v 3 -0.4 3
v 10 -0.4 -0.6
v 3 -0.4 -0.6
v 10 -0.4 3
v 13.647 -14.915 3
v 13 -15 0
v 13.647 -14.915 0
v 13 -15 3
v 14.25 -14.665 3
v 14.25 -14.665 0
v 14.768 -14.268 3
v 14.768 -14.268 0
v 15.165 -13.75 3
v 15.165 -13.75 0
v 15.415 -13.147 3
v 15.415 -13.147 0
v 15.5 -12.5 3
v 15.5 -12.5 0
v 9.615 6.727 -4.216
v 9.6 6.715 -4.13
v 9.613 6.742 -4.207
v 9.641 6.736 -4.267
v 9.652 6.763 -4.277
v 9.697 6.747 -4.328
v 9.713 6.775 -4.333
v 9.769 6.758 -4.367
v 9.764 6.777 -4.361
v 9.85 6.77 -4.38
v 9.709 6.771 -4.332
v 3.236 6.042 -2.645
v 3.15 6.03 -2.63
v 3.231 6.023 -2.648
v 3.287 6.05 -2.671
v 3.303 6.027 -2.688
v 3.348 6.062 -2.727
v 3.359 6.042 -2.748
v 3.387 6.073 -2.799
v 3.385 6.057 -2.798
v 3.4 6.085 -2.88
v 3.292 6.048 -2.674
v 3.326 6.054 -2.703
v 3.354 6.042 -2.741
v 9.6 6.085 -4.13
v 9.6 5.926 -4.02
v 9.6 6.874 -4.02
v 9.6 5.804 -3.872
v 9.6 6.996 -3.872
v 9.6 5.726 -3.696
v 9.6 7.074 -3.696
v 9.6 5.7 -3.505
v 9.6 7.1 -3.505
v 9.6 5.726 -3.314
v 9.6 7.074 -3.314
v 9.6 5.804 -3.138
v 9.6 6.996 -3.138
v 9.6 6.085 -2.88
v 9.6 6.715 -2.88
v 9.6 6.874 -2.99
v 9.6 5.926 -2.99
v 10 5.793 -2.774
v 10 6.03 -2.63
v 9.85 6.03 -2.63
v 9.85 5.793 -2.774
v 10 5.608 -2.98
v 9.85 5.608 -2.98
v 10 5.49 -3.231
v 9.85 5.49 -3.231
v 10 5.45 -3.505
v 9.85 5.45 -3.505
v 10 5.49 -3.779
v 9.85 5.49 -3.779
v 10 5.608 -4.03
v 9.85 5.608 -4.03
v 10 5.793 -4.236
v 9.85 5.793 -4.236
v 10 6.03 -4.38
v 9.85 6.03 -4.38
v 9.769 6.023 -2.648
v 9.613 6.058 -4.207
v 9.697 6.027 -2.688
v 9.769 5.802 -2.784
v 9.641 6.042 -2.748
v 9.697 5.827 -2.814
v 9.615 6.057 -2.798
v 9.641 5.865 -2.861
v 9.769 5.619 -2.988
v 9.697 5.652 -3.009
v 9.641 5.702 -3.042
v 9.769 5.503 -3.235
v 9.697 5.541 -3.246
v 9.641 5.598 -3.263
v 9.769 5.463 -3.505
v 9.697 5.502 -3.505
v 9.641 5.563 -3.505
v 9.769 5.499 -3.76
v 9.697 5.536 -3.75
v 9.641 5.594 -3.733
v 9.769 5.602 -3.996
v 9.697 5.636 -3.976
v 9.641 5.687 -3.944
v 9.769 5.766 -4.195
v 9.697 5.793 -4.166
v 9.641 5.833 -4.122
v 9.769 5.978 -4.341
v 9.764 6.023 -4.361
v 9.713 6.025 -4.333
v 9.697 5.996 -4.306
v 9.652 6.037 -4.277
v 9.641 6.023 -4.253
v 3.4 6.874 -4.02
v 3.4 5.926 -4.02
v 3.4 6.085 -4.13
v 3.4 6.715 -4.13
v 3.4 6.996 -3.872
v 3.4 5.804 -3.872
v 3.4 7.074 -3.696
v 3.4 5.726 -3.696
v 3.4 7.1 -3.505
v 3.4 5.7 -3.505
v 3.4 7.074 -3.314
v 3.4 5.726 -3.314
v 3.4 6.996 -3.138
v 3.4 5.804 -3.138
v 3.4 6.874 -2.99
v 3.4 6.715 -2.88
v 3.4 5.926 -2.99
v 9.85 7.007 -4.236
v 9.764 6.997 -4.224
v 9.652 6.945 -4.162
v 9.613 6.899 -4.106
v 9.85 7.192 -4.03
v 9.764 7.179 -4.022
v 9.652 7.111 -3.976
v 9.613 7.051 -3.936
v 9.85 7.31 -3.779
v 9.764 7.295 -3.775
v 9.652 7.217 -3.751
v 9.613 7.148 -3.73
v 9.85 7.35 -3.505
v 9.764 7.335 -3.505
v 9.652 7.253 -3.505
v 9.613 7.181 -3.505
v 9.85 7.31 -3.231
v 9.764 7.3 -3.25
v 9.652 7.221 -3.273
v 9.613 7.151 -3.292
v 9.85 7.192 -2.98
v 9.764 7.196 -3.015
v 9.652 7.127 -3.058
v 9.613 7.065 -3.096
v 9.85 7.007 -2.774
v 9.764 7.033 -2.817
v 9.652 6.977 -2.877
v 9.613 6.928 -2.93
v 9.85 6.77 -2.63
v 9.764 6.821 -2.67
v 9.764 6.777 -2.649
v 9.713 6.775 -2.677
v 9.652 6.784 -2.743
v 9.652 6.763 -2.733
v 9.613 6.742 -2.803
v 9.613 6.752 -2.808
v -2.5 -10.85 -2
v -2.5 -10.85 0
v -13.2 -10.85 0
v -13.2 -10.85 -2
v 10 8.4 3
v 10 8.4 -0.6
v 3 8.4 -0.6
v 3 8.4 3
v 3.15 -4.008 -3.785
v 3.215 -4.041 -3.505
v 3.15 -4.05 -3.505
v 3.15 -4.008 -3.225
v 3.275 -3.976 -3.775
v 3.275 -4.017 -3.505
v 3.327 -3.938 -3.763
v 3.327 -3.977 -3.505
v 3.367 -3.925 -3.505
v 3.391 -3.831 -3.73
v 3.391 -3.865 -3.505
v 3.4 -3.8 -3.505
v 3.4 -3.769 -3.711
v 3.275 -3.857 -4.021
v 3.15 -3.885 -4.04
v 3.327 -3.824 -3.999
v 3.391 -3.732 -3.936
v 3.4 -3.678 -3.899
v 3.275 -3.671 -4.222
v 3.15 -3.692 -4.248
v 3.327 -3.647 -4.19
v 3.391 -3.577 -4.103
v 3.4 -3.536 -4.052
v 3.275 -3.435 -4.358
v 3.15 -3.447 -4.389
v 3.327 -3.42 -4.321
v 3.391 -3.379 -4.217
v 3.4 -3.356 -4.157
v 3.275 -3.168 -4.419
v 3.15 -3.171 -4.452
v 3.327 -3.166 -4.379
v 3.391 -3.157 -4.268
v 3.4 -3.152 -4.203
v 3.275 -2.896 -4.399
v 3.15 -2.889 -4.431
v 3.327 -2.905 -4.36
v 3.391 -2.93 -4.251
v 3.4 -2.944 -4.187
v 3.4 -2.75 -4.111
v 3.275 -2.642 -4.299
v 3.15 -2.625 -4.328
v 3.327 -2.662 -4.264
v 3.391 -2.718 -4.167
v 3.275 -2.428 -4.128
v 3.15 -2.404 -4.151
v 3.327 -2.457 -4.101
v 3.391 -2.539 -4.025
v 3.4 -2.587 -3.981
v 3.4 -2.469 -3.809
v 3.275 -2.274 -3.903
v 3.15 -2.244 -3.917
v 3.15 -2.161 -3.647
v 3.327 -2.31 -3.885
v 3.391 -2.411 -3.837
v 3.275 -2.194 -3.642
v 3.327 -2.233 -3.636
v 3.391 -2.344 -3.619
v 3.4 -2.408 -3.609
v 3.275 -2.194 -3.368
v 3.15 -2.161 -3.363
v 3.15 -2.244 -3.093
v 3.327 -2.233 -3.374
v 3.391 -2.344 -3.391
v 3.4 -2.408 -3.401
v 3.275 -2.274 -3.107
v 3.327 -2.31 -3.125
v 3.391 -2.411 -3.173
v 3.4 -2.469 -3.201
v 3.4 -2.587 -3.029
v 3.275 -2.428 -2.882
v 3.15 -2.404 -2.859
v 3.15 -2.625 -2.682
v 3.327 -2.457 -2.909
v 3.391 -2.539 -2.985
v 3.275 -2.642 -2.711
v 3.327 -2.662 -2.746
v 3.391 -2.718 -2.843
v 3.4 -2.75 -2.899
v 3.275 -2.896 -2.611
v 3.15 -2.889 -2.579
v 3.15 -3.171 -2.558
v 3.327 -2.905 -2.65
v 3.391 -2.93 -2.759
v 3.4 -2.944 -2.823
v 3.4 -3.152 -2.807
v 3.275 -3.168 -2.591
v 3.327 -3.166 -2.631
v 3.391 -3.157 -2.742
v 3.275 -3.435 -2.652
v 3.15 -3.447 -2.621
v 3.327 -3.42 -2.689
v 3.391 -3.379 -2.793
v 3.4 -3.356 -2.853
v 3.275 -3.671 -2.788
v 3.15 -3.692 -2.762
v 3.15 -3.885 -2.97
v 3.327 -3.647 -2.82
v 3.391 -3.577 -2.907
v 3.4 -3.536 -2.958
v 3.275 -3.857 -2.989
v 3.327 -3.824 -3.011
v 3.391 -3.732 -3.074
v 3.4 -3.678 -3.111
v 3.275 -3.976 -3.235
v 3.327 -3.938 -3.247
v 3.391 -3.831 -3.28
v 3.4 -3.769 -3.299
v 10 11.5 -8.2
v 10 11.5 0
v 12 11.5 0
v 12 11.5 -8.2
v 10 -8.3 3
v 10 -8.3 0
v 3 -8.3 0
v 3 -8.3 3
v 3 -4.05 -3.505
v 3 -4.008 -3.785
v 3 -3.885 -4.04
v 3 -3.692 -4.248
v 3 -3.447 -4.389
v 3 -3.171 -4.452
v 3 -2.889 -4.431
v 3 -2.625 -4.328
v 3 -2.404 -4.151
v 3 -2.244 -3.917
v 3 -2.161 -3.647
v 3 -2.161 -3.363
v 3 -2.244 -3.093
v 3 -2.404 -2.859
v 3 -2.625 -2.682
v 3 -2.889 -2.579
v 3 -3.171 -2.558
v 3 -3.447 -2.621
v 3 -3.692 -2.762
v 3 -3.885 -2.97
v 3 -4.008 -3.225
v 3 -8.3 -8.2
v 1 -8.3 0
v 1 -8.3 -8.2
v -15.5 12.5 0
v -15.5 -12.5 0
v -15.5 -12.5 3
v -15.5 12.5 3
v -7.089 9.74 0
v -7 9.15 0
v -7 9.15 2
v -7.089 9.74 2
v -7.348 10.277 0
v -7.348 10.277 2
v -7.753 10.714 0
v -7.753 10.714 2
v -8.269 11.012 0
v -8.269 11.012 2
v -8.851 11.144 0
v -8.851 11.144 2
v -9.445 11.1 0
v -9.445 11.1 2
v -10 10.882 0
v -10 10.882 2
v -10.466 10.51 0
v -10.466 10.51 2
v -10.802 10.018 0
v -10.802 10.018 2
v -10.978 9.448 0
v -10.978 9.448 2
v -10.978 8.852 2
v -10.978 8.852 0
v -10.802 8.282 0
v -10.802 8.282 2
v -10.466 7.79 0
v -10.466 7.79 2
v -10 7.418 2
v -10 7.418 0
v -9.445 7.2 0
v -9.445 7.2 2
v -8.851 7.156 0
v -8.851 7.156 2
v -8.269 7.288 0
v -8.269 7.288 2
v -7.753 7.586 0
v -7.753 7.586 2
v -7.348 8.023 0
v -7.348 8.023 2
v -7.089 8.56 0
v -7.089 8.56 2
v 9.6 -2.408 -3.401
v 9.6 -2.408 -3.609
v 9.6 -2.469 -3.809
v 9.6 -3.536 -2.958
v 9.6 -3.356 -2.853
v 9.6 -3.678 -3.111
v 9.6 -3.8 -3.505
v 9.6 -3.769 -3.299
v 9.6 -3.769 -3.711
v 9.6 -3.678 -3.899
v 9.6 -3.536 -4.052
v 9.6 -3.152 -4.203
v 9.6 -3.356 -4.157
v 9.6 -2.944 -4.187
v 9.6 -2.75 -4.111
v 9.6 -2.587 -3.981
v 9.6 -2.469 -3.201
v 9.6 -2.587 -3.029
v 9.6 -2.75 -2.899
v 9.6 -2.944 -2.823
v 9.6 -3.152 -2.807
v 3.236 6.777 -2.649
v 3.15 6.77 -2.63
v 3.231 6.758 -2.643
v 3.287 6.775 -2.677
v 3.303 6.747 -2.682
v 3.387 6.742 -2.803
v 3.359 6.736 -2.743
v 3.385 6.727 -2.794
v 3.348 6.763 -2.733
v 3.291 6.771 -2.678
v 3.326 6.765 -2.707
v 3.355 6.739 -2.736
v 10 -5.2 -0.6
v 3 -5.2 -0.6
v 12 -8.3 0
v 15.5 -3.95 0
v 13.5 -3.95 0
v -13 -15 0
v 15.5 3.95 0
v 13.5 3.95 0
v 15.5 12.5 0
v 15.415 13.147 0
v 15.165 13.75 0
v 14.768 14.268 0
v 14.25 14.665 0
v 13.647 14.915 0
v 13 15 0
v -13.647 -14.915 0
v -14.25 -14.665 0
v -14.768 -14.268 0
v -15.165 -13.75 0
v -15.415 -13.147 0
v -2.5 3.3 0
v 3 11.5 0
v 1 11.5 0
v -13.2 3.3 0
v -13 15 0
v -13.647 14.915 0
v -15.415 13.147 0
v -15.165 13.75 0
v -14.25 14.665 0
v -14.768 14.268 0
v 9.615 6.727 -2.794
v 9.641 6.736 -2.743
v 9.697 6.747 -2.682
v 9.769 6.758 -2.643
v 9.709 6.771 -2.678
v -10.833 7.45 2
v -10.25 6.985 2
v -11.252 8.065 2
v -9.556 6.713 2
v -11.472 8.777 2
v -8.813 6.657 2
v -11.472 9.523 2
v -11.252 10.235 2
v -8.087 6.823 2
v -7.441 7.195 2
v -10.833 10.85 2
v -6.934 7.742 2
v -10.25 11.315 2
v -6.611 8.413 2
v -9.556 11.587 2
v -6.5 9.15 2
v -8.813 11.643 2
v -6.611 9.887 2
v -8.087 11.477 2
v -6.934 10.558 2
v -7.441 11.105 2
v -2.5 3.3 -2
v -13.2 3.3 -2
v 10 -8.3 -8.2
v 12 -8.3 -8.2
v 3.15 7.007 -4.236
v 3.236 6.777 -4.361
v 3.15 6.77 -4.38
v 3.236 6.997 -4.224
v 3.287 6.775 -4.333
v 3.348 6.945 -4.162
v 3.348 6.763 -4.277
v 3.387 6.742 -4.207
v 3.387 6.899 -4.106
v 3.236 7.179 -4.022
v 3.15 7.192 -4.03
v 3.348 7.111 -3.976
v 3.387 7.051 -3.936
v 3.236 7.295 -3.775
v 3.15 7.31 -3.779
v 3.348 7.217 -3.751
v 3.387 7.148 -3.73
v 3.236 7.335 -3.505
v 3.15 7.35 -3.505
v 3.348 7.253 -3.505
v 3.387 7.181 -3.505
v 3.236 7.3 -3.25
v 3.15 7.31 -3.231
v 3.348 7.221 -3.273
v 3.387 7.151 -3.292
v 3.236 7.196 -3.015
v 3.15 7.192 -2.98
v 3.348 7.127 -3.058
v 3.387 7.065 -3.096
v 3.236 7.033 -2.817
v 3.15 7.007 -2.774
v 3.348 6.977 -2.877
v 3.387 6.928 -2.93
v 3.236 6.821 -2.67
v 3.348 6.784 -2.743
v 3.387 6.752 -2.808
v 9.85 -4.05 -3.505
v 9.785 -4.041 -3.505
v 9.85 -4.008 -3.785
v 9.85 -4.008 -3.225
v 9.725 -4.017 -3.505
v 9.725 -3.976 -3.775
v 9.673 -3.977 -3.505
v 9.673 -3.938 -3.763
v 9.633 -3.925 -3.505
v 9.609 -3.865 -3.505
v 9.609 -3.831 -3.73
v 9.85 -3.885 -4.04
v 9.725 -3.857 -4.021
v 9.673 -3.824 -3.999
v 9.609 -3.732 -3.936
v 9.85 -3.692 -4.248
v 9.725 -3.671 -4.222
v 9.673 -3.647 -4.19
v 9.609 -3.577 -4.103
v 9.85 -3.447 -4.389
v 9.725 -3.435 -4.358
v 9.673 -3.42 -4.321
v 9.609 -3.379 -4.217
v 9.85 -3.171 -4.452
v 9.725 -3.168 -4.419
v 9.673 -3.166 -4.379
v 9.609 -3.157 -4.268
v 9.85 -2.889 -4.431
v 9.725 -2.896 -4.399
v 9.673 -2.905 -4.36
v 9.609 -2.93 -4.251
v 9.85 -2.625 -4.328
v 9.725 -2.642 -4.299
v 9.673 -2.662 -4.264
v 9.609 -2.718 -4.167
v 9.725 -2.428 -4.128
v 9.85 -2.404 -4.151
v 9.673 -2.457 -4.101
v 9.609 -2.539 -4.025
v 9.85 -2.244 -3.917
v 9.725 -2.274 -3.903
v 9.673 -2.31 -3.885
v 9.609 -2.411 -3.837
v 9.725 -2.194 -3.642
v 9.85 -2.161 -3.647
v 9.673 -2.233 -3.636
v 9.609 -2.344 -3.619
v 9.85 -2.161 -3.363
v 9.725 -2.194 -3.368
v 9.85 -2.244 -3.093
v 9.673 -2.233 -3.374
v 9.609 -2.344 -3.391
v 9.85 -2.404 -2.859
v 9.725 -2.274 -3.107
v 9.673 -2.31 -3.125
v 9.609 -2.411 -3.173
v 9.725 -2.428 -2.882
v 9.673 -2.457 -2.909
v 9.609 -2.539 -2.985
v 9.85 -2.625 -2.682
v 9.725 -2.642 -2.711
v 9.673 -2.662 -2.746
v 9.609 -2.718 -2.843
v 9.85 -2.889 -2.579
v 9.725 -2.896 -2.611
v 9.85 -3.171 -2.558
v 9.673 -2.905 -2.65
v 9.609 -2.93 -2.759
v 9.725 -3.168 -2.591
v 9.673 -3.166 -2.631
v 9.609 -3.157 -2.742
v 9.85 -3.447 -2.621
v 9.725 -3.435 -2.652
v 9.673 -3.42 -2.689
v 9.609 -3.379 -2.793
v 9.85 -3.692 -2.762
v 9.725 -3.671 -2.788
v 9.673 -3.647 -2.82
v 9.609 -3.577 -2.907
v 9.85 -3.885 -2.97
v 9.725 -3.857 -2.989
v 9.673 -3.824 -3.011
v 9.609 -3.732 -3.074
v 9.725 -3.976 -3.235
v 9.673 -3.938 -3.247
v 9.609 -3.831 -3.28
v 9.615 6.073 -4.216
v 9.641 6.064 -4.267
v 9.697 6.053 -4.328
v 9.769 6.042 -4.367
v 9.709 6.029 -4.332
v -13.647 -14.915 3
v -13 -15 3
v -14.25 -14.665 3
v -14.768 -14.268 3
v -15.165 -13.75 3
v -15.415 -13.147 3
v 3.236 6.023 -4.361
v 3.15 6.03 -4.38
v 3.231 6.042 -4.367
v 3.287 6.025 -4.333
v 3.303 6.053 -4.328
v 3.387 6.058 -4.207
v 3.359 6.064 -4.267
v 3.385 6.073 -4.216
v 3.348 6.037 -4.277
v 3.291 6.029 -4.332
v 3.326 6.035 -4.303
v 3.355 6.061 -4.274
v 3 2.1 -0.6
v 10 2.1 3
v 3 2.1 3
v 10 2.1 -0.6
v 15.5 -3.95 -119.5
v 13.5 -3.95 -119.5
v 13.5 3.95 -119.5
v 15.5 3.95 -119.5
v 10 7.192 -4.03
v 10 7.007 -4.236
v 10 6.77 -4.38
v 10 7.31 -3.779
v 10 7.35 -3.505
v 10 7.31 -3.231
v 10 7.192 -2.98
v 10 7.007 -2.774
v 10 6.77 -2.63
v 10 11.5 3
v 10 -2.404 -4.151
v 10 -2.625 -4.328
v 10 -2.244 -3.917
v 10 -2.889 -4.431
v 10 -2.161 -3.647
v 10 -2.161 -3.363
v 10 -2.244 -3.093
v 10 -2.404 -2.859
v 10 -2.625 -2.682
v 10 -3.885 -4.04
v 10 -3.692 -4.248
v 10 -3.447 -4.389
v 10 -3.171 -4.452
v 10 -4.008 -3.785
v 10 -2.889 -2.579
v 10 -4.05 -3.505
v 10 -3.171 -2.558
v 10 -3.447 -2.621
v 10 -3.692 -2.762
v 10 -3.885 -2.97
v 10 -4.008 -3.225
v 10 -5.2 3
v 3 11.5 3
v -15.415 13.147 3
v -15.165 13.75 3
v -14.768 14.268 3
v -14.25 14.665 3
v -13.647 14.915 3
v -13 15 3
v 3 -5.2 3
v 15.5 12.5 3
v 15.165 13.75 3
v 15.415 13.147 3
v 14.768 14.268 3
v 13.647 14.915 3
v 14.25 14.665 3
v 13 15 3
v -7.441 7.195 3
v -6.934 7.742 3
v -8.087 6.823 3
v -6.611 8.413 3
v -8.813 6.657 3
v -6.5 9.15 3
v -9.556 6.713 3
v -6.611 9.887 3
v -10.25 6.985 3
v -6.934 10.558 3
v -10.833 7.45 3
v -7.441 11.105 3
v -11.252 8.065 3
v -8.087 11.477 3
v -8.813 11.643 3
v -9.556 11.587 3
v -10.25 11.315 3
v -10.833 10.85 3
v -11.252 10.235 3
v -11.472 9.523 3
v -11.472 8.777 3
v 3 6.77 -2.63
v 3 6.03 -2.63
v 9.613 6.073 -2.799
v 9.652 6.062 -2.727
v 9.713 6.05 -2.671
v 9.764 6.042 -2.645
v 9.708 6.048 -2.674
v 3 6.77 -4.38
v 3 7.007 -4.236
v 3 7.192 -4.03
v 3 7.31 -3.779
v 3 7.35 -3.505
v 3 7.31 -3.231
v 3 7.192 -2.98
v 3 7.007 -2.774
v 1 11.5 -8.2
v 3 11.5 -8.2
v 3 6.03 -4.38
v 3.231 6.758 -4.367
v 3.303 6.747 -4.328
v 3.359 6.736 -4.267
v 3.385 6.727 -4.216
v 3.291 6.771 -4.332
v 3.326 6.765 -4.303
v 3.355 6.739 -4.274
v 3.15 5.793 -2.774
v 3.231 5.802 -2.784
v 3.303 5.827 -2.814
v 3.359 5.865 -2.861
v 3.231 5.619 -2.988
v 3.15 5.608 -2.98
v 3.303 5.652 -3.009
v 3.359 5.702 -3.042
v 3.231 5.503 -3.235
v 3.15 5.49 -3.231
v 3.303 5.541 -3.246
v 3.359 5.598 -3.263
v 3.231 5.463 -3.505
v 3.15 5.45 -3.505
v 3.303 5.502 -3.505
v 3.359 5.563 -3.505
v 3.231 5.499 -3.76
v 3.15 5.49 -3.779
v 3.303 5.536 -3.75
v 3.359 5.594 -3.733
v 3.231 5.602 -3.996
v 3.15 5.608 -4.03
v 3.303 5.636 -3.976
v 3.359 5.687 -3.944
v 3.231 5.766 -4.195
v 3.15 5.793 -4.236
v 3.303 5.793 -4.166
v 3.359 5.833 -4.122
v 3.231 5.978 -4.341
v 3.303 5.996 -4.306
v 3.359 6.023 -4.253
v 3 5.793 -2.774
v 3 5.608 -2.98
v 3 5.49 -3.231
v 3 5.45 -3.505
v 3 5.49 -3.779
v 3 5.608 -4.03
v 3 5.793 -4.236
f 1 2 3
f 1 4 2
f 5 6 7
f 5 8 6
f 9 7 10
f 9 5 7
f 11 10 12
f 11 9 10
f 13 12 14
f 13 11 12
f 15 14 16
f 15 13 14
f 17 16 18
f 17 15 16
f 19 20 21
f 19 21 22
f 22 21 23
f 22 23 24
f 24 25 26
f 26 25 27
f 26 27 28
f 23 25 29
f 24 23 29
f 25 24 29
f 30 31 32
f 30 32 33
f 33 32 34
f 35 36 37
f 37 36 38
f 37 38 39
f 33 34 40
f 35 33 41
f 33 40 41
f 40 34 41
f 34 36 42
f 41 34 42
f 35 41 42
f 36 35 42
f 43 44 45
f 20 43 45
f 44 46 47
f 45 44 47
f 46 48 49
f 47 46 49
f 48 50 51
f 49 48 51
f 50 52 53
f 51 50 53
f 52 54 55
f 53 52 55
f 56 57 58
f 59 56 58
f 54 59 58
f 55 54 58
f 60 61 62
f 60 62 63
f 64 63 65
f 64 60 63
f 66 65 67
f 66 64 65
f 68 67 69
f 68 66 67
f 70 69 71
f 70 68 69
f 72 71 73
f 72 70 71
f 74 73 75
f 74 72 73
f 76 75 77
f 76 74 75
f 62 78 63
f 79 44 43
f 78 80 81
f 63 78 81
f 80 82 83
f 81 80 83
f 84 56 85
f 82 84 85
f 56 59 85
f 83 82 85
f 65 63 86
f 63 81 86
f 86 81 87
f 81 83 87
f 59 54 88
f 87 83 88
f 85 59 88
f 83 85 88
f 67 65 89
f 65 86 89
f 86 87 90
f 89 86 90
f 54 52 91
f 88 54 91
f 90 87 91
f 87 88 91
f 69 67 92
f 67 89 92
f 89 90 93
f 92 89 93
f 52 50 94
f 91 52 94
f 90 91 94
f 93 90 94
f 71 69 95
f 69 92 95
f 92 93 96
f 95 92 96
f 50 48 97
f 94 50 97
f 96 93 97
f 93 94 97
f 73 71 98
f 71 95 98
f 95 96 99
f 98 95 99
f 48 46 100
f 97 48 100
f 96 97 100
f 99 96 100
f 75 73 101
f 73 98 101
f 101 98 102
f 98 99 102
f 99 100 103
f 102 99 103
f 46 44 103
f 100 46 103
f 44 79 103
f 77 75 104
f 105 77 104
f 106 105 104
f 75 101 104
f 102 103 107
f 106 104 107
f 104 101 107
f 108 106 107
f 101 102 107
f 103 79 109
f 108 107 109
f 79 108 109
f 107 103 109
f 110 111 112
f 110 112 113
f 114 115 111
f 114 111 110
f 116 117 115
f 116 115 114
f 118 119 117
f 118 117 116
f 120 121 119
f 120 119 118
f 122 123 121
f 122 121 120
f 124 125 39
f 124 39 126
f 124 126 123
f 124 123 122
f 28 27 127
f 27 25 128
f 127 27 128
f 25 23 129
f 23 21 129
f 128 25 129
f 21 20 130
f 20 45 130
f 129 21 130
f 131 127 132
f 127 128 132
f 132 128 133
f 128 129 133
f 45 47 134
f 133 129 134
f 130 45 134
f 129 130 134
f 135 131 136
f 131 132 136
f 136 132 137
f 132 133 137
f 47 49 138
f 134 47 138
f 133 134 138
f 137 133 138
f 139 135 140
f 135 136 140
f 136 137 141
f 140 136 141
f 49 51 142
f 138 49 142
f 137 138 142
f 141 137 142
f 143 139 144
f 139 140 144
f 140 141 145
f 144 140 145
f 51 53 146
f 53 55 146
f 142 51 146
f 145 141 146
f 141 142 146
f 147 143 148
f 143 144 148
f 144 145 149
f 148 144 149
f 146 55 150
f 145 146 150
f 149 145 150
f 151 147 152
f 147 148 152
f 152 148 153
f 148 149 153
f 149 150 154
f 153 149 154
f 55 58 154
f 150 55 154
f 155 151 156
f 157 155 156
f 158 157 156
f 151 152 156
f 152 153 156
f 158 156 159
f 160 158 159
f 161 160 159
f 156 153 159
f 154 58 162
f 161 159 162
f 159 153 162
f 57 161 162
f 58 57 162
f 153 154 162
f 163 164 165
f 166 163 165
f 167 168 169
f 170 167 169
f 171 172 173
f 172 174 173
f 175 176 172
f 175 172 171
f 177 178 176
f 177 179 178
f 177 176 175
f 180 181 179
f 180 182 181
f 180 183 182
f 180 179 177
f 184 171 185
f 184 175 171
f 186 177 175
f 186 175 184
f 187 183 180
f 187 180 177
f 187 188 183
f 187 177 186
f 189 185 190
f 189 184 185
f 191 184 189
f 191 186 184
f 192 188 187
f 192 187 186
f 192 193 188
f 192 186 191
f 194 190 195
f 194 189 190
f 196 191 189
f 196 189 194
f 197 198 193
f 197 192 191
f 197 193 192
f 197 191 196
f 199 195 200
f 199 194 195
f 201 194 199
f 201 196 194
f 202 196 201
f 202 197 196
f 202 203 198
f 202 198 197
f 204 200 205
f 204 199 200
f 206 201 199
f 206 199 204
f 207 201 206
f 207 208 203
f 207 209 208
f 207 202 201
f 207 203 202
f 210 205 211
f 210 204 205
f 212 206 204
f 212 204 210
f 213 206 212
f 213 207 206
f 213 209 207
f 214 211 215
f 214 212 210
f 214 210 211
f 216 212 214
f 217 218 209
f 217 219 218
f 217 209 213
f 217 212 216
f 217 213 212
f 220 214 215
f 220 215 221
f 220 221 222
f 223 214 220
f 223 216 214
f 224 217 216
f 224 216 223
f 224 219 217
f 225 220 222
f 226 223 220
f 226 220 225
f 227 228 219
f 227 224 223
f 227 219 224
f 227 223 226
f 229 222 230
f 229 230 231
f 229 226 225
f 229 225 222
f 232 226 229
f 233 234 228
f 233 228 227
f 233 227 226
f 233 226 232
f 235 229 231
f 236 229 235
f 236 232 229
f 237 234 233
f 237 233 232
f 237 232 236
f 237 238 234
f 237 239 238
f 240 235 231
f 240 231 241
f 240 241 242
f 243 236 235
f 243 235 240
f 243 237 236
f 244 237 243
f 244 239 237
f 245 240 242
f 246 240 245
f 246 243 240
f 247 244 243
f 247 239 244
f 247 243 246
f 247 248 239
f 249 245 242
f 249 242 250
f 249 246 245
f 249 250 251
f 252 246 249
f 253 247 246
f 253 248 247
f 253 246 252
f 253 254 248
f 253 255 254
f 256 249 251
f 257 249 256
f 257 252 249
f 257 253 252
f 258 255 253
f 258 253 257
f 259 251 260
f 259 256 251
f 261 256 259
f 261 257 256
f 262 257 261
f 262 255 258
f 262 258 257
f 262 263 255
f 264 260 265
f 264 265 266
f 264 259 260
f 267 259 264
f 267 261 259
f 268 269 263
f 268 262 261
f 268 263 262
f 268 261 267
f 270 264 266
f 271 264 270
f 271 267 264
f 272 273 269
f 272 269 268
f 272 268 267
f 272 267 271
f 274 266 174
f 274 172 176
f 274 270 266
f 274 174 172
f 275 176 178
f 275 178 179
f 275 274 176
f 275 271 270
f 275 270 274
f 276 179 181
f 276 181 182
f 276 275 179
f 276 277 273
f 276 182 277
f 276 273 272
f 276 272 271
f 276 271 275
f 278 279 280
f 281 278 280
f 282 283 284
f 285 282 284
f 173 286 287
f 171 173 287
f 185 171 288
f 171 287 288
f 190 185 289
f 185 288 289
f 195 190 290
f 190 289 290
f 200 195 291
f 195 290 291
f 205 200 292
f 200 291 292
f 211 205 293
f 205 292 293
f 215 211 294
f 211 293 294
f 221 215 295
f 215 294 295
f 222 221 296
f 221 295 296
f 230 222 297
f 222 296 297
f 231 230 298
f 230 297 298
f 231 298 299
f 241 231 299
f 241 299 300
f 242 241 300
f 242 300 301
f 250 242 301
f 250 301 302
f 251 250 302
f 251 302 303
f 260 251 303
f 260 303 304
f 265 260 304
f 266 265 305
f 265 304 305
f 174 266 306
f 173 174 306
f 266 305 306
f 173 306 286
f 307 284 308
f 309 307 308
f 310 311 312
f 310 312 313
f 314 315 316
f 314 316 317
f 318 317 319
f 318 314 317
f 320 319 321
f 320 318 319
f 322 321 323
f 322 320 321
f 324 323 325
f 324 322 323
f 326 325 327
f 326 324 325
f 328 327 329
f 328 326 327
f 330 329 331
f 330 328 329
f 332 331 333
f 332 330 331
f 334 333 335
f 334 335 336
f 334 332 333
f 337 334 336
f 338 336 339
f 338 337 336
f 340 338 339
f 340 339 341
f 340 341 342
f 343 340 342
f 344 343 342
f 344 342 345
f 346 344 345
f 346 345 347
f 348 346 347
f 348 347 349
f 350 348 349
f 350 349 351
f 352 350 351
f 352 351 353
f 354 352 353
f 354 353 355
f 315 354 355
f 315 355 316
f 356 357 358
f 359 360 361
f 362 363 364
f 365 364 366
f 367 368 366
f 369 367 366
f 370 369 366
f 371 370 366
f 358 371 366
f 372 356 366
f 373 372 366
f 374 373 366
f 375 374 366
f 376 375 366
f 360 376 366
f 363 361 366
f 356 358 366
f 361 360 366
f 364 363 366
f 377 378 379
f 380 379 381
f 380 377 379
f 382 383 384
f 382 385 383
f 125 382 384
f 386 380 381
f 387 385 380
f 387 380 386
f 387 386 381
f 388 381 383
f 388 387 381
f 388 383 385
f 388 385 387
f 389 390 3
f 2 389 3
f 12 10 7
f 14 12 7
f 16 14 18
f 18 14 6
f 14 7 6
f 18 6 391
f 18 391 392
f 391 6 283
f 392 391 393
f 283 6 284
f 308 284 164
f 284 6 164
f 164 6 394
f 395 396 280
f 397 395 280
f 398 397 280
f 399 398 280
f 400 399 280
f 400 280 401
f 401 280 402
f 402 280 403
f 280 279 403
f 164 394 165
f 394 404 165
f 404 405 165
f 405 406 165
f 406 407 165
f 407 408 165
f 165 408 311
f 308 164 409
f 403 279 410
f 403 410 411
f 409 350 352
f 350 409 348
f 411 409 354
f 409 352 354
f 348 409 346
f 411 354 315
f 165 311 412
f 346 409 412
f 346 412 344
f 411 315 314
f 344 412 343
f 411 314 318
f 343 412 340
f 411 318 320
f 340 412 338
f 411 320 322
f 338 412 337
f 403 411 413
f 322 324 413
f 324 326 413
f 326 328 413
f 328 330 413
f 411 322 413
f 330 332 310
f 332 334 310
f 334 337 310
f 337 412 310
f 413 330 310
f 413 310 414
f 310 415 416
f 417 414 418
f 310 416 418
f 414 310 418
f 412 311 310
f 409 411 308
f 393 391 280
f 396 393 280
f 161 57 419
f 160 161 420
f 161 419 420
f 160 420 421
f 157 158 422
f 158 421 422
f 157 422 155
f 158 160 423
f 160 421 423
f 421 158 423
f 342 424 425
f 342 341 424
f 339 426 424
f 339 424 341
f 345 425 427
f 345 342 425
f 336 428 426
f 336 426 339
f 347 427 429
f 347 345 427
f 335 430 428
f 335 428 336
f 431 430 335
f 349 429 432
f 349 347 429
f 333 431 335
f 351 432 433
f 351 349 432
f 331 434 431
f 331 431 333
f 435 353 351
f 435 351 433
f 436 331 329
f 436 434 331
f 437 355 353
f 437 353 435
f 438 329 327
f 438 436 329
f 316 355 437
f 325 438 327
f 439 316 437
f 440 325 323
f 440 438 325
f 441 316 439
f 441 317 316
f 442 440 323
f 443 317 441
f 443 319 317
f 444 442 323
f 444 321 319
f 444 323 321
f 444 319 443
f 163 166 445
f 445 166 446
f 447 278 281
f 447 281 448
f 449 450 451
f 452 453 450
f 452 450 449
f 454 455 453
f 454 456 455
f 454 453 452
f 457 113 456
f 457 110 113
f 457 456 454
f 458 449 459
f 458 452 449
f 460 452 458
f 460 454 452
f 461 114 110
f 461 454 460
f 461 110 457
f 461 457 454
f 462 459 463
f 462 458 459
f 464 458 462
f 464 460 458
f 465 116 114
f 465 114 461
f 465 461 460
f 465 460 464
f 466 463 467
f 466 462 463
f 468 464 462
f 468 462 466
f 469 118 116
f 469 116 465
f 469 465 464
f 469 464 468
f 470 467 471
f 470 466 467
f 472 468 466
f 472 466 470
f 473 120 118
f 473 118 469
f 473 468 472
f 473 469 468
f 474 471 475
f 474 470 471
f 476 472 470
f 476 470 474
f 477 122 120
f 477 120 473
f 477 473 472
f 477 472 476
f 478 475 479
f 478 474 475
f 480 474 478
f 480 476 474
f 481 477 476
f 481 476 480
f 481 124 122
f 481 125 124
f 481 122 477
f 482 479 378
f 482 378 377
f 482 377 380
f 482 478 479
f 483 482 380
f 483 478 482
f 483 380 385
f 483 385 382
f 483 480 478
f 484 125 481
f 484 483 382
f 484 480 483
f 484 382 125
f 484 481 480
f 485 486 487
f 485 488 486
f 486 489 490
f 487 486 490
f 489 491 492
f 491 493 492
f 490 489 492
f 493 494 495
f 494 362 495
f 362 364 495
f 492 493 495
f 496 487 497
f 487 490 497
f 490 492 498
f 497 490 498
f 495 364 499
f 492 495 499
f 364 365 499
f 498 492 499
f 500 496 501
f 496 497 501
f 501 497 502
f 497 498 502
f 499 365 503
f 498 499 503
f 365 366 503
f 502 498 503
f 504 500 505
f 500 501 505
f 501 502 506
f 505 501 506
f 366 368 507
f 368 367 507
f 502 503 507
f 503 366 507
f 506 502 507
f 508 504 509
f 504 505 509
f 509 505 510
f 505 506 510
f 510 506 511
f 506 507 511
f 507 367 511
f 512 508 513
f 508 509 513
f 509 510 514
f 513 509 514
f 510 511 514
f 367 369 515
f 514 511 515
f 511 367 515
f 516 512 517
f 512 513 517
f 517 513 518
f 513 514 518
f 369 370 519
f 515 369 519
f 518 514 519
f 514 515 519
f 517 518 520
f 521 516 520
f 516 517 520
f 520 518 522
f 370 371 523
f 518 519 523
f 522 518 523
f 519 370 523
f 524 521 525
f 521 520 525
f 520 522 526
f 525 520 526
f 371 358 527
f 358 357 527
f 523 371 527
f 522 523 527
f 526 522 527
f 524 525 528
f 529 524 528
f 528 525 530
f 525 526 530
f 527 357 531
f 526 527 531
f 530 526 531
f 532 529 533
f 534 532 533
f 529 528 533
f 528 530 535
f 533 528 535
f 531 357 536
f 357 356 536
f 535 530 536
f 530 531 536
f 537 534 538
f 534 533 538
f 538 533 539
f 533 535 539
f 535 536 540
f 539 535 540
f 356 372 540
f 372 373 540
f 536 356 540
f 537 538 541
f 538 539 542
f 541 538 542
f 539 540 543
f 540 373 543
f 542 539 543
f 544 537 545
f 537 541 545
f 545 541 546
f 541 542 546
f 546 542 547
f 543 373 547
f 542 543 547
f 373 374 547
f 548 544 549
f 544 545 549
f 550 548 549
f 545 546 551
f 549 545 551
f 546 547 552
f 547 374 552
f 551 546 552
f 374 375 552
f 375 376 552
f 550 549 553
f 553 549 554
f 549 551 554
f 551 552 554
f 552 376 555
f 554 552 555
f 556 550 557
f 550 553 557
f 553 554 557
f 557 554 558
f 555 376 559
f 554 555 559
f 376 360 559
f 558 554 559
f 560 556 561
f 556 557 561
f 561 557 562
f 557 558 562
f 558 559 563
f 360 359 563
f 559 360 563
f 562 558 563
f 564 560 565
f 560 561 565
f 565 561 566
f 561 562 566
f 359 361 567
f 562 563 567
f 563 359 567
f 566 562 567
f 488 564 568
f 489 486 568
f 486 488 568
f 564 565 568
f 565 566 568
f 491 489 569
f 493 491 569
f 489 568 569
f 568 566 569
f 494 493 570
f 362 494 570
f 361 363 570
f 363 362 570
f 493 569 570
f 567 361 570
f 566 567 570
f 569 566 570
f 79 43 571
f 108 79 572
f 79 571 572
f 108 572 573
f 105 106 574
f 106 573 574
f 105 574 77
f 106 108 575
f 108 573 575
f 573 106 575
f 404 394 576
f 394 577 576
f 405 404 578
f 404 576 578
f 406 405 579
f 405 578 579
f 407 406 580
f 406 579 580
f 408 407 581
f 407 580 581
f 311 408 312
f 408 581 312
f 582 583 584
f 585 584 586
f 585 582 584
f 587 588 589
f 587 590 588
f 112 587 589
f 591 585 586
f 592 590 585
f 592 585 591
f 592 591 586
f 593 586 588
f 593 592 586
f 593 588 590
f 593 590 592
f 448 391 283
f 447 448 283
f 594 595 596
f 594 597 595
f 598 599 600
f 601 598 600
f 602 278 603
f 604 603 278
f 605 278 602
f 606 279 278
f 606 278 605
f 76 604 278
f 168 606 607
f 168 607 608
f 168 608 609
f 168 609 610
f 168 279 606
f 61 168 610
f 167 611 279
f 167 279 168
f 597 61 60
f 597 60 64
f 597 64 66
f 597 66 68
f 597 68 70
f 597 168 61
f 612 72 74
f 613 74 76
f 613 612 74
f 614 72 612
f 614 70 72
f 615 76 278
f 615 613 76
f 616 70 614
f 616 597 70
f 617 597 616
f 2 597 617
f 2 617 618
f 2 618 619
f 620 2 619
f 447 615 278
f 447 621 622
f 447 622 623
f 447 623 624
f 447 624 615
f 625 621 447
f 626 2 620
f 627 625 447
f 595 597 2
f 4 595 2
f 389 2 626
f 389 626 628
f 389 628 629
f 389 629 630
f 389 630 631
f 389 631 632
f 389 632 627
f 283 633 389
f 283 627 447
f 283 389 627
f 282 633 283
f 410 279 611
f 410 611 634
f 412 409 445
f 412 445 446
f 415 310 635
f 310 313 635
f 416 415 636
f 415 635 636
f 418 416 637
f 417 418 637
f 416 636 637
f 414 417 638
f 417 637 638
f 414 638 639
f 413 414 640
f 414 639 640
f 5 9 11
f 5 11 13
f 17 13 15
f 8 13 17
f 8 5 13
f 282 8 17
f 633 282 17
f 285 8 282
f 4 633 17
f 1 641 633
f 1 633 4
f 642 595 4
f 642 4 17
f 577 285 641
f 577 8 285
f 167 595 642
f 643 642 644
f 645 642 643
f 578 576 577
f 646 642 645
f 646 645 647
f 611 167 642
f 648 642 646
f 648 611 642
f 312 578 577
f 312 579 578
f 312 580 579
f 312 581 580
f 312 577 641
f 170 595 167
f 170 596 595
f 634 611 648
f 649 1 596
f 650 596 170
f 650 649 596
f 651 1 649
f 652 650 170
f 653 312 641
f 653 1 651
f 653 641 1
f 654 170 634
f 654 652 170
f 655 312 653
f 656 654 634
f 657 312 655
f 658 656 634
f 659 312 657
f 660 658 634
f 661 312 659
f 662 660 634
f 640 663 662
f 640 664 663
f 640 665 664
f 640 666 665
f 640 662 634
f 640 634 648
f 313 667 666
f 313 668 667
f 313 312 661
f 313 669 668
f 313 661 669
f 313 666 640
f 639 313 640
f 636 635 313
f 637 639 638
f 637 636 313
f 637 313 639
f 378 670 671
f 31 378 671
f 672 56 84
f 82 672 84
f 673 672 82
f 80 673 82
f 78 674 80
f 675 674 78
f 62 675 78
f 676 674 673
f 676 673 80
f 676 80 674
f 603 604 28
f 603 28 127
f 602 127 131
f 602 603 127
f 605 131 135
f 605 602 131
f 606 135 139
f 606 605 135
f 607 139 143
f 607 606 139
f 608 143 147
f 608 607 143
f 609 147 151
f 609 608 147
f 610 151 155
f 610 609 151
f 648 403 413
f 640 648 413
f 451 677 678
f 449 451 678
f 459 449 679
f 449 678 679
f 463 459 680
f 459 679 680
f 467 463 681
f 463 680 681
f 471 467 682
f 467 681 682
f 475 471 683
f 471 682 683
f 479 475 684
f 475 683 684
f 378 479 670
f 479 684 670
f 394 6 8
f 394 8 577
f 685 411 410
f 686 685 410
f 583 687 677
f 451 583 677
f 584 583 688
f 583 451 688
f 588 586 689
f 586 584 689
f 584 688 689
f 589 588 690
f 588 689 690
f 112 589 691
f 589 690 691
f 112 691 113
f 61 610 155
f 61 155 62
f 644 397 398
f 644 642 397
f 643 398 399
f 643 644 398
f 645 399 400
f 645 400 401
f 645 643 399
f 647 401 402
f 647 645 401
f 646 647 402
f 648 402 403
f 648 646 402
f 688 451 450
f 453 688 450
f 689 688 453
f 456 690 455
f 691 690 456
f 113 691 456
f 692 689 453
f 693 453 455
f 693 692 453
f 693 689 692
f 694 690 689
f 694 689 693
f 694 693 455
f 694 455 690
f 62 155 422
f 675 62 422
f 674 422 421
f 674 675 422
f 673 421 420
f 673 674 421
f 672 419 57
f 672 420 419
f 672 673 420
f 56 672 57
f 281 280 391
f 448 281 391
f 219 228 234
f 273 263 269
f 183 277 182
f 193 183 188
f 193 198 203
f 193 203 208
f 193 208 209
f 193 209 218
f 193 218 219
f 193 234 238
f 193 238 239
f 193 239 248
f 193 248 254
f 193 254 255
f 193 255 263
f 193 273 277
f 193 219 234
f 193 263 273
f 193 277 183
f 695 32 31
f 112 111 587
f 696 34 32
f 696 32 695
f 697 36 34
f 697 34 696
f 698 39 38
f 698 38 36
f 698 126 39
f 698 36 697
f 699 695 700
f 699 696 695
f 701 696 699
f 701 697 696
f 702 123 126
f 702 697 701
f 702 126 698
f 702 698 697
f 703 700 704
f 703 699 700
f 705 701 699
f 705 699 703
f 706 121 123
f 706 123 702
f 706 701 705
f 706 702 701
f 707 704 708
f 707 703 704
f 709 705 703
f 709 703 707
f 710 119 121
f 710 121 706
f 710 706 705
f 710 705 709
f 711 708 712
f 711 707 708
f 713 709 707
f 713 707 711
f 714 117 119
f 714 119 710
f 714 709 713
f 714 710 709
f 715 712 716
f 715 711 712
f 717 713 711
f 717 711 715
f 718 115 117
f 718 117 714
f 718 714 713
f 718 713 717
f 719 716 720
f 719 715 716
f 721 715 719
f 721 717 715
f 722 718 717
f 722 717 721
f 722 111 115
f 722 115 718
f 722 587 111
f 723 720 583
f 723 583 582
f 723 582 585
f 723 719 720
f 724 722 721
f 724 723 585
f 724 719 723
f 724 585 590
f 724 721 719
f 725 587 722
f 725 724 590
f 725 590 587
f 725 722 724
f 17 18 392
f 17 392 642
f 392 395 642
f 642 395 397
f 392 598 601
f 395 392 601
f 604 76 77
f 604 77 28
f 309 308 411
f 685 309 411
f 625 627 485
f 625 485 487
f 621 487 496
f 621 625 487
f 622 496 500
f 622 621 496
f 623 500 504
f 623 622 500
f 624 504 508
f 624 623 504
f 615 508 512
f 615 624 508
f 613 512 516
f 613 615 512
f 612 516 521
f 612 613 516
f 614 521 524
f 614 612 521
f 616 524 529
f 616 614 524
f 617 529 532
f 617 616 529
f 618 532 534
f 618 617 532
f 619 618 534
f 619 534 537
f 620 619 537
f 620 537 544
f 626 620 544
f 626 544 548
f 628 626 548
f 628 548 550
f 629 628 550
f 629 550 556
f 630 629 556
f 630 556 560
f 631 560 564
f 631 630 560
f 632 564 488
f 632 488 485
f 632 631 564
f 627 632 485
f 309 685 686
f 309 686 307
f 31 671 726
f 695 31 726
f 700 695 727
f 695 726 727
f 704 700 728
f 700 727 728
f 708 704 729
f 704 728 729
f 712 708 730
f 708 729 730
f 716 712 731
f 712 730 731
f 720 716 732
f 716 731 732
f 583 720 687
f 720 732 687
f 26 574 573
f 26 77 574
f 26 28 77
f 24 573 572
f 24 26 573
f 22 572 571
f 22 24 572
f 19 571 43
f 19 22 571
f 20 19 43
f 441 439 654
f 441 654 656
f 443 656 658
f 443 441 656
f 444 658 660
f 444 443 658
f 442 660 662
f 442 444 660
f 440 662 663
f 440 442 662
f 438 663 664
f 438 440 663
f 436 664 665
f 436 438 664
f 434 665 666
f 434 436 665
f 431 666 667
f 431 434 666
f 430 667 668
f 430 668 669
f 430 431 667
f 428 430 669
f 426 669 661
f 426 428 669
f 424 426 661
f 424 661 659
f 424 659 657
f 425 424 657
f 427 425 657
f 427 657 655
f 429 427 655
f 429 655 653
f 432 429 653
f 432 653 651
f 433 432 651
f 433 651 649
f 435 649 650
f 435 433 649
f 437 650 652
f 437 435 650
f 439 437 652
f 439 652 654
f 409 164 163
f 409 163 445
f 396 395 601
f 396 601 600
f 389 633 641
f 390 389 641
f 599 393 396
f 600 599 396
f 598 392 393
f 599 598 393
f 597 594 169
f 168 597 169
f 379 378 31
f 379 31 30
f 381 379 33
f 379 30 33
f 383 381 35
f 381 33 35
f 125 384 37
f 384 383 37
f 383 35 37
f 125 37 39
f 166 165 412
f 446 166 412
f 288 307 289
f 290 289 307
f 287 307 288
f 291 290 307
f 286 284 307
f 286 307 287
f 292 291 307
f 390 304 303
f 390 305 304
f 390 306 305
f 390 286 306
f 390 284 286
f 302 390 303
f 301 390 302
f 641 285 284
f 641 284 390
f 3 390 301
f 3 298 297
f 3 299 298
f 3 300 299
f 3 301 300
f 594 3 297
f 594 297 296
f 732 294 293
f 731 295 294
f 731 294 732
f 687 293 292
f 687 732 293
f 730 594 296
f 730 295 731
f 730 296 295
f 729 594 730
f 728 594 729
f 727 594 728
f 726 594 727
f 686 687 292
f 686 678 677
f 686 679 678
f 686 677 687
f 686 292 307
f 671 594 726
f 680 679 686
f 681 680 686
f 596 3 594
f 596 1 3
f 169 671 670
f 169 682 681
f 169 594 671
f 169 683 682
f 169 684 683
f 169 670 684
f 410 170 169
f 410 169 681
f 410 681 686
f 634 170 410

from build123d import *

# Parameters (mm, degrees)
CROQUIS2_W               = 30
CROQUIS2_H               = 31
CROQUIS2_W_2             = 3.1
CROQUIS2_H_2             = 7
CROQUIS2_W_3             = 2.5
CROQUIS2_R               = 2
SALIENTE_EXTRUIR1_DEPTH  = 3
CORTAR_EXTRUIR1_START    = 2
CROQUIS2_4_R             = 2.5
CROQUIS2_4_R_2           = 2
CORTAR_EXTRUIR1_DEPTH    = 1
CROQUIS2_5_W             = 14.15
CROQUIS2_5_H             = 10.7
SALIENTE_EXTRUIR2_DEPTH  = 2
CROQUIS2_7_W             = 7.9
CROQUIS2_7_H             = 2
SALIENTE_EXTRUIR3_DEPTH  = 119.5
CROQUIS2_9_W             = 4.8
CROQUIS2_9_H             = 7
CROQUIS2_9_W_2           = 6.3
SALIENTE_EXTRUIR4_DEPTH  = 0.6
SALIENTE_EXTRUIR5_DEPTH  = 8.2
CROQUIS3_R               = 0.95
SALIENTE_EXTRUIR6_DEPTH  = 0.4
REDONDEO1_R              = 0.25
REDONDEO1_OF_SIMETR_A1_R = 0.25
REDONDEO2_R              = 2.5


with BuildPart() as part:
    # Croquis2 → Saliente-Extruir1 (new body)
    with BuildSketch(Plane(origin=(0, 0, 0), x_dir=(0, 1, 0), z_dir=(0, 0, 1))):
        Rectangle(CROQUIS2_W, CROQUIS2_H)
        with Locations((9.95, -6.5)):
            Rectangle(CROQUIS2_W_2, CROQUIS2_H_2, mode=Mode.SUBTRACT)
        with Locations((0.85, -6.5)):
            Rectangle(CROQUIS2_W_3, CROQUIS2_H_2, mode=Mode.SUBTRACT)
        with Locations((-6.75, -6.5)):
            Rectangle(CROQUIS2_W_2, CROQUIS2_H_2, mode=Mode.SUBTRACT)
        with Locations(Location((9.15, 9, 0), (0, 0, 270))):
            Circle(CROQUIS2_R, mode=Mode.SUBTRACT)
    extrude(amount=SALIENTE_EXTRUIR1_DEPTH)

    # Croquis2<4> → Cortar-Extruir1 (cut)
    with BuildSketch(Plane(origin=(0, 0, 0), x_dir=(0, 1, 0), z_dir=(0, 0, 1)).offset(CORTAR_EXTRUIR1_START)):
        with Locations(Location((9.15, 9, 0), (0, 0, 270))):
            Circle(CROQUIS2_4_R)
        with Locations(Location((9.15, 9, 0), (0, 0, 270))):
            Circle(CROQUIS2_4_R_2, mode=Mode.SUBTRACT)
    extrude(amount=CORTAR_EXTRUIR1_DEPTH, mode=Mode.SUBTRACT)

    # Croquis2<5> → Saliente-Extruir2 (add)
    with BuildSketch(Plane(origin=(0, 0, 0), x_dir=(0, 1, 0), z_dir=(0, 0, 1))):
        with Locations((-3.775, 7.85)):
            Rectangle(CROQUIS2_5_W, CROQUIS2_5_H)
    extrude(amount=-SALIENTE_EXTRUIR2_DEPTH)

    # Croquis2<7> → Saliente-Extruir3 (add)
    with BuildSketch(Plane(origin=(0, 0, 0), x_dir=(0, 1, 0), z_dir=(0, 0, 1))):
        with Locations((0, -14.5)):
            Rectangle(CROQUIS2_7_W, CROQUIS2_7_H)
    extrude(amount=-SALIENTE_EXTRUIR3_DEPTH)

    # Croquis2<9> → Saliente-Extruir4 (add)
    with BuildSketch(Plane(origin=(0, 0, 0), x_dir=(0, 1, 0), z_dir=(0, 0, 1))):
        with Locations((-2.8, -6.5)):
            Rectangle(CROQUIS2_9_W, CROQUIS2_9_H)
        with Locations((5.25, -6.5)):
            Rectangle(CROQUIS2_9_W_2, CROQUIS2_9_H)
    extrude(amount=-SALIENTE_EXTRUIR4_DEPTH)

    # Croquis2<11> → Saliente-Extruir5 (add)
    with BuildSketch(Plane(origin=(0, 0, 0), x_dir=(0, 1, 0), z_dir=(0, 0, 1))):
        Polygon((-8.3, -3), (-8.3, -1), (11.5, -1), (11.5, -3), (8.4, -3), (2.1, -3), (-0.4, -3), (-5.2, -3), align=None)
        Polygon((11.5, -10), (11.5, -12), (-8.3, -12), (-8.3, -10), (-5.2, -10), (-0.4, -10), (2.1, -10), (8.4, -10), align=None)
    extrude(amount=-SALIENTE_EXTRUIR5_DEPTH)

    # Croquis3 → Saliente-Extruir6 (add)
    with BuildSketch(Plane.YZ.offset(3)):
        with Locations(Location((-3.1, -3.505, 0), (0, 0, 180))):
            Circle(CROQUIS3_R)
        with BuildLine():
            Line((6.769966215, -2.63), (6.030033785, -2.63))
            ThreePointArc((6.030033785, -2.63), (5.45, -3.505), (6.030033785, -4.38))
            Line((6.030033785, -4.38), (6.769966215, -4.38))
            ThreePointArc((6.769966215, -4.38), (7.35, -3.505), (6.769966215, -2.63))
        make_face()
    saliente_extruir6 = extrude(amount=SALIENTE_EXTRUIR6_DEPTH)

    # Redondeo1
    redondeo1_edges = [part.edges().sort_by_distance(p)[0] for p in [
        (3.4, -2.15, -3.505),
        (3.4, 7.35, -3.505),
        (3.4, 6.4, -2.63),
        (3.4, 5.45, -3.505),
        (3.4, 6.4, -4.38),
    ]]
    fillet(redondeo1_edges, radius=REDONDEO1_R)

    # Simetría1: Saliente-Extruir6 across plane
    add(saliente_extruir6.mirror(Plane(origin=(6.5, 0, 0), x_dir=(0, 0, 1), z_dir=(1, 0, 0))))

    # Redondeo1 of Simetría1
    redondeo1_of_simetr_a1_edges = [part.edges().sort_by_distance(p)[0] for p in [
        (9.6, -2.15, -3.505),
        (9.6, 7.35, -3.505),
        (9.6, 6.4, -2.63),
        (9.6, 5.45, -3.505),
        (9.6, 6.4, -4.38),
    ]]
    fillet(redondeo1_of_simetr_a1_edges, radius=REDONDEO1_OF_SIMETR_A1_R)

    # Redondeo2
    redondeo2_edges = [part.edges().sort_by_distance(p)[0] for p in [
        (-15.5, -15, 1.5),
        (-15.5, 15, 1.5),
        (15.5, 15, 1.5),
        (15.5, -15, 1.5),
    ]]
    fillet(redondeo2_edges, radius=REDONDEO2_R)


solid = part.part
